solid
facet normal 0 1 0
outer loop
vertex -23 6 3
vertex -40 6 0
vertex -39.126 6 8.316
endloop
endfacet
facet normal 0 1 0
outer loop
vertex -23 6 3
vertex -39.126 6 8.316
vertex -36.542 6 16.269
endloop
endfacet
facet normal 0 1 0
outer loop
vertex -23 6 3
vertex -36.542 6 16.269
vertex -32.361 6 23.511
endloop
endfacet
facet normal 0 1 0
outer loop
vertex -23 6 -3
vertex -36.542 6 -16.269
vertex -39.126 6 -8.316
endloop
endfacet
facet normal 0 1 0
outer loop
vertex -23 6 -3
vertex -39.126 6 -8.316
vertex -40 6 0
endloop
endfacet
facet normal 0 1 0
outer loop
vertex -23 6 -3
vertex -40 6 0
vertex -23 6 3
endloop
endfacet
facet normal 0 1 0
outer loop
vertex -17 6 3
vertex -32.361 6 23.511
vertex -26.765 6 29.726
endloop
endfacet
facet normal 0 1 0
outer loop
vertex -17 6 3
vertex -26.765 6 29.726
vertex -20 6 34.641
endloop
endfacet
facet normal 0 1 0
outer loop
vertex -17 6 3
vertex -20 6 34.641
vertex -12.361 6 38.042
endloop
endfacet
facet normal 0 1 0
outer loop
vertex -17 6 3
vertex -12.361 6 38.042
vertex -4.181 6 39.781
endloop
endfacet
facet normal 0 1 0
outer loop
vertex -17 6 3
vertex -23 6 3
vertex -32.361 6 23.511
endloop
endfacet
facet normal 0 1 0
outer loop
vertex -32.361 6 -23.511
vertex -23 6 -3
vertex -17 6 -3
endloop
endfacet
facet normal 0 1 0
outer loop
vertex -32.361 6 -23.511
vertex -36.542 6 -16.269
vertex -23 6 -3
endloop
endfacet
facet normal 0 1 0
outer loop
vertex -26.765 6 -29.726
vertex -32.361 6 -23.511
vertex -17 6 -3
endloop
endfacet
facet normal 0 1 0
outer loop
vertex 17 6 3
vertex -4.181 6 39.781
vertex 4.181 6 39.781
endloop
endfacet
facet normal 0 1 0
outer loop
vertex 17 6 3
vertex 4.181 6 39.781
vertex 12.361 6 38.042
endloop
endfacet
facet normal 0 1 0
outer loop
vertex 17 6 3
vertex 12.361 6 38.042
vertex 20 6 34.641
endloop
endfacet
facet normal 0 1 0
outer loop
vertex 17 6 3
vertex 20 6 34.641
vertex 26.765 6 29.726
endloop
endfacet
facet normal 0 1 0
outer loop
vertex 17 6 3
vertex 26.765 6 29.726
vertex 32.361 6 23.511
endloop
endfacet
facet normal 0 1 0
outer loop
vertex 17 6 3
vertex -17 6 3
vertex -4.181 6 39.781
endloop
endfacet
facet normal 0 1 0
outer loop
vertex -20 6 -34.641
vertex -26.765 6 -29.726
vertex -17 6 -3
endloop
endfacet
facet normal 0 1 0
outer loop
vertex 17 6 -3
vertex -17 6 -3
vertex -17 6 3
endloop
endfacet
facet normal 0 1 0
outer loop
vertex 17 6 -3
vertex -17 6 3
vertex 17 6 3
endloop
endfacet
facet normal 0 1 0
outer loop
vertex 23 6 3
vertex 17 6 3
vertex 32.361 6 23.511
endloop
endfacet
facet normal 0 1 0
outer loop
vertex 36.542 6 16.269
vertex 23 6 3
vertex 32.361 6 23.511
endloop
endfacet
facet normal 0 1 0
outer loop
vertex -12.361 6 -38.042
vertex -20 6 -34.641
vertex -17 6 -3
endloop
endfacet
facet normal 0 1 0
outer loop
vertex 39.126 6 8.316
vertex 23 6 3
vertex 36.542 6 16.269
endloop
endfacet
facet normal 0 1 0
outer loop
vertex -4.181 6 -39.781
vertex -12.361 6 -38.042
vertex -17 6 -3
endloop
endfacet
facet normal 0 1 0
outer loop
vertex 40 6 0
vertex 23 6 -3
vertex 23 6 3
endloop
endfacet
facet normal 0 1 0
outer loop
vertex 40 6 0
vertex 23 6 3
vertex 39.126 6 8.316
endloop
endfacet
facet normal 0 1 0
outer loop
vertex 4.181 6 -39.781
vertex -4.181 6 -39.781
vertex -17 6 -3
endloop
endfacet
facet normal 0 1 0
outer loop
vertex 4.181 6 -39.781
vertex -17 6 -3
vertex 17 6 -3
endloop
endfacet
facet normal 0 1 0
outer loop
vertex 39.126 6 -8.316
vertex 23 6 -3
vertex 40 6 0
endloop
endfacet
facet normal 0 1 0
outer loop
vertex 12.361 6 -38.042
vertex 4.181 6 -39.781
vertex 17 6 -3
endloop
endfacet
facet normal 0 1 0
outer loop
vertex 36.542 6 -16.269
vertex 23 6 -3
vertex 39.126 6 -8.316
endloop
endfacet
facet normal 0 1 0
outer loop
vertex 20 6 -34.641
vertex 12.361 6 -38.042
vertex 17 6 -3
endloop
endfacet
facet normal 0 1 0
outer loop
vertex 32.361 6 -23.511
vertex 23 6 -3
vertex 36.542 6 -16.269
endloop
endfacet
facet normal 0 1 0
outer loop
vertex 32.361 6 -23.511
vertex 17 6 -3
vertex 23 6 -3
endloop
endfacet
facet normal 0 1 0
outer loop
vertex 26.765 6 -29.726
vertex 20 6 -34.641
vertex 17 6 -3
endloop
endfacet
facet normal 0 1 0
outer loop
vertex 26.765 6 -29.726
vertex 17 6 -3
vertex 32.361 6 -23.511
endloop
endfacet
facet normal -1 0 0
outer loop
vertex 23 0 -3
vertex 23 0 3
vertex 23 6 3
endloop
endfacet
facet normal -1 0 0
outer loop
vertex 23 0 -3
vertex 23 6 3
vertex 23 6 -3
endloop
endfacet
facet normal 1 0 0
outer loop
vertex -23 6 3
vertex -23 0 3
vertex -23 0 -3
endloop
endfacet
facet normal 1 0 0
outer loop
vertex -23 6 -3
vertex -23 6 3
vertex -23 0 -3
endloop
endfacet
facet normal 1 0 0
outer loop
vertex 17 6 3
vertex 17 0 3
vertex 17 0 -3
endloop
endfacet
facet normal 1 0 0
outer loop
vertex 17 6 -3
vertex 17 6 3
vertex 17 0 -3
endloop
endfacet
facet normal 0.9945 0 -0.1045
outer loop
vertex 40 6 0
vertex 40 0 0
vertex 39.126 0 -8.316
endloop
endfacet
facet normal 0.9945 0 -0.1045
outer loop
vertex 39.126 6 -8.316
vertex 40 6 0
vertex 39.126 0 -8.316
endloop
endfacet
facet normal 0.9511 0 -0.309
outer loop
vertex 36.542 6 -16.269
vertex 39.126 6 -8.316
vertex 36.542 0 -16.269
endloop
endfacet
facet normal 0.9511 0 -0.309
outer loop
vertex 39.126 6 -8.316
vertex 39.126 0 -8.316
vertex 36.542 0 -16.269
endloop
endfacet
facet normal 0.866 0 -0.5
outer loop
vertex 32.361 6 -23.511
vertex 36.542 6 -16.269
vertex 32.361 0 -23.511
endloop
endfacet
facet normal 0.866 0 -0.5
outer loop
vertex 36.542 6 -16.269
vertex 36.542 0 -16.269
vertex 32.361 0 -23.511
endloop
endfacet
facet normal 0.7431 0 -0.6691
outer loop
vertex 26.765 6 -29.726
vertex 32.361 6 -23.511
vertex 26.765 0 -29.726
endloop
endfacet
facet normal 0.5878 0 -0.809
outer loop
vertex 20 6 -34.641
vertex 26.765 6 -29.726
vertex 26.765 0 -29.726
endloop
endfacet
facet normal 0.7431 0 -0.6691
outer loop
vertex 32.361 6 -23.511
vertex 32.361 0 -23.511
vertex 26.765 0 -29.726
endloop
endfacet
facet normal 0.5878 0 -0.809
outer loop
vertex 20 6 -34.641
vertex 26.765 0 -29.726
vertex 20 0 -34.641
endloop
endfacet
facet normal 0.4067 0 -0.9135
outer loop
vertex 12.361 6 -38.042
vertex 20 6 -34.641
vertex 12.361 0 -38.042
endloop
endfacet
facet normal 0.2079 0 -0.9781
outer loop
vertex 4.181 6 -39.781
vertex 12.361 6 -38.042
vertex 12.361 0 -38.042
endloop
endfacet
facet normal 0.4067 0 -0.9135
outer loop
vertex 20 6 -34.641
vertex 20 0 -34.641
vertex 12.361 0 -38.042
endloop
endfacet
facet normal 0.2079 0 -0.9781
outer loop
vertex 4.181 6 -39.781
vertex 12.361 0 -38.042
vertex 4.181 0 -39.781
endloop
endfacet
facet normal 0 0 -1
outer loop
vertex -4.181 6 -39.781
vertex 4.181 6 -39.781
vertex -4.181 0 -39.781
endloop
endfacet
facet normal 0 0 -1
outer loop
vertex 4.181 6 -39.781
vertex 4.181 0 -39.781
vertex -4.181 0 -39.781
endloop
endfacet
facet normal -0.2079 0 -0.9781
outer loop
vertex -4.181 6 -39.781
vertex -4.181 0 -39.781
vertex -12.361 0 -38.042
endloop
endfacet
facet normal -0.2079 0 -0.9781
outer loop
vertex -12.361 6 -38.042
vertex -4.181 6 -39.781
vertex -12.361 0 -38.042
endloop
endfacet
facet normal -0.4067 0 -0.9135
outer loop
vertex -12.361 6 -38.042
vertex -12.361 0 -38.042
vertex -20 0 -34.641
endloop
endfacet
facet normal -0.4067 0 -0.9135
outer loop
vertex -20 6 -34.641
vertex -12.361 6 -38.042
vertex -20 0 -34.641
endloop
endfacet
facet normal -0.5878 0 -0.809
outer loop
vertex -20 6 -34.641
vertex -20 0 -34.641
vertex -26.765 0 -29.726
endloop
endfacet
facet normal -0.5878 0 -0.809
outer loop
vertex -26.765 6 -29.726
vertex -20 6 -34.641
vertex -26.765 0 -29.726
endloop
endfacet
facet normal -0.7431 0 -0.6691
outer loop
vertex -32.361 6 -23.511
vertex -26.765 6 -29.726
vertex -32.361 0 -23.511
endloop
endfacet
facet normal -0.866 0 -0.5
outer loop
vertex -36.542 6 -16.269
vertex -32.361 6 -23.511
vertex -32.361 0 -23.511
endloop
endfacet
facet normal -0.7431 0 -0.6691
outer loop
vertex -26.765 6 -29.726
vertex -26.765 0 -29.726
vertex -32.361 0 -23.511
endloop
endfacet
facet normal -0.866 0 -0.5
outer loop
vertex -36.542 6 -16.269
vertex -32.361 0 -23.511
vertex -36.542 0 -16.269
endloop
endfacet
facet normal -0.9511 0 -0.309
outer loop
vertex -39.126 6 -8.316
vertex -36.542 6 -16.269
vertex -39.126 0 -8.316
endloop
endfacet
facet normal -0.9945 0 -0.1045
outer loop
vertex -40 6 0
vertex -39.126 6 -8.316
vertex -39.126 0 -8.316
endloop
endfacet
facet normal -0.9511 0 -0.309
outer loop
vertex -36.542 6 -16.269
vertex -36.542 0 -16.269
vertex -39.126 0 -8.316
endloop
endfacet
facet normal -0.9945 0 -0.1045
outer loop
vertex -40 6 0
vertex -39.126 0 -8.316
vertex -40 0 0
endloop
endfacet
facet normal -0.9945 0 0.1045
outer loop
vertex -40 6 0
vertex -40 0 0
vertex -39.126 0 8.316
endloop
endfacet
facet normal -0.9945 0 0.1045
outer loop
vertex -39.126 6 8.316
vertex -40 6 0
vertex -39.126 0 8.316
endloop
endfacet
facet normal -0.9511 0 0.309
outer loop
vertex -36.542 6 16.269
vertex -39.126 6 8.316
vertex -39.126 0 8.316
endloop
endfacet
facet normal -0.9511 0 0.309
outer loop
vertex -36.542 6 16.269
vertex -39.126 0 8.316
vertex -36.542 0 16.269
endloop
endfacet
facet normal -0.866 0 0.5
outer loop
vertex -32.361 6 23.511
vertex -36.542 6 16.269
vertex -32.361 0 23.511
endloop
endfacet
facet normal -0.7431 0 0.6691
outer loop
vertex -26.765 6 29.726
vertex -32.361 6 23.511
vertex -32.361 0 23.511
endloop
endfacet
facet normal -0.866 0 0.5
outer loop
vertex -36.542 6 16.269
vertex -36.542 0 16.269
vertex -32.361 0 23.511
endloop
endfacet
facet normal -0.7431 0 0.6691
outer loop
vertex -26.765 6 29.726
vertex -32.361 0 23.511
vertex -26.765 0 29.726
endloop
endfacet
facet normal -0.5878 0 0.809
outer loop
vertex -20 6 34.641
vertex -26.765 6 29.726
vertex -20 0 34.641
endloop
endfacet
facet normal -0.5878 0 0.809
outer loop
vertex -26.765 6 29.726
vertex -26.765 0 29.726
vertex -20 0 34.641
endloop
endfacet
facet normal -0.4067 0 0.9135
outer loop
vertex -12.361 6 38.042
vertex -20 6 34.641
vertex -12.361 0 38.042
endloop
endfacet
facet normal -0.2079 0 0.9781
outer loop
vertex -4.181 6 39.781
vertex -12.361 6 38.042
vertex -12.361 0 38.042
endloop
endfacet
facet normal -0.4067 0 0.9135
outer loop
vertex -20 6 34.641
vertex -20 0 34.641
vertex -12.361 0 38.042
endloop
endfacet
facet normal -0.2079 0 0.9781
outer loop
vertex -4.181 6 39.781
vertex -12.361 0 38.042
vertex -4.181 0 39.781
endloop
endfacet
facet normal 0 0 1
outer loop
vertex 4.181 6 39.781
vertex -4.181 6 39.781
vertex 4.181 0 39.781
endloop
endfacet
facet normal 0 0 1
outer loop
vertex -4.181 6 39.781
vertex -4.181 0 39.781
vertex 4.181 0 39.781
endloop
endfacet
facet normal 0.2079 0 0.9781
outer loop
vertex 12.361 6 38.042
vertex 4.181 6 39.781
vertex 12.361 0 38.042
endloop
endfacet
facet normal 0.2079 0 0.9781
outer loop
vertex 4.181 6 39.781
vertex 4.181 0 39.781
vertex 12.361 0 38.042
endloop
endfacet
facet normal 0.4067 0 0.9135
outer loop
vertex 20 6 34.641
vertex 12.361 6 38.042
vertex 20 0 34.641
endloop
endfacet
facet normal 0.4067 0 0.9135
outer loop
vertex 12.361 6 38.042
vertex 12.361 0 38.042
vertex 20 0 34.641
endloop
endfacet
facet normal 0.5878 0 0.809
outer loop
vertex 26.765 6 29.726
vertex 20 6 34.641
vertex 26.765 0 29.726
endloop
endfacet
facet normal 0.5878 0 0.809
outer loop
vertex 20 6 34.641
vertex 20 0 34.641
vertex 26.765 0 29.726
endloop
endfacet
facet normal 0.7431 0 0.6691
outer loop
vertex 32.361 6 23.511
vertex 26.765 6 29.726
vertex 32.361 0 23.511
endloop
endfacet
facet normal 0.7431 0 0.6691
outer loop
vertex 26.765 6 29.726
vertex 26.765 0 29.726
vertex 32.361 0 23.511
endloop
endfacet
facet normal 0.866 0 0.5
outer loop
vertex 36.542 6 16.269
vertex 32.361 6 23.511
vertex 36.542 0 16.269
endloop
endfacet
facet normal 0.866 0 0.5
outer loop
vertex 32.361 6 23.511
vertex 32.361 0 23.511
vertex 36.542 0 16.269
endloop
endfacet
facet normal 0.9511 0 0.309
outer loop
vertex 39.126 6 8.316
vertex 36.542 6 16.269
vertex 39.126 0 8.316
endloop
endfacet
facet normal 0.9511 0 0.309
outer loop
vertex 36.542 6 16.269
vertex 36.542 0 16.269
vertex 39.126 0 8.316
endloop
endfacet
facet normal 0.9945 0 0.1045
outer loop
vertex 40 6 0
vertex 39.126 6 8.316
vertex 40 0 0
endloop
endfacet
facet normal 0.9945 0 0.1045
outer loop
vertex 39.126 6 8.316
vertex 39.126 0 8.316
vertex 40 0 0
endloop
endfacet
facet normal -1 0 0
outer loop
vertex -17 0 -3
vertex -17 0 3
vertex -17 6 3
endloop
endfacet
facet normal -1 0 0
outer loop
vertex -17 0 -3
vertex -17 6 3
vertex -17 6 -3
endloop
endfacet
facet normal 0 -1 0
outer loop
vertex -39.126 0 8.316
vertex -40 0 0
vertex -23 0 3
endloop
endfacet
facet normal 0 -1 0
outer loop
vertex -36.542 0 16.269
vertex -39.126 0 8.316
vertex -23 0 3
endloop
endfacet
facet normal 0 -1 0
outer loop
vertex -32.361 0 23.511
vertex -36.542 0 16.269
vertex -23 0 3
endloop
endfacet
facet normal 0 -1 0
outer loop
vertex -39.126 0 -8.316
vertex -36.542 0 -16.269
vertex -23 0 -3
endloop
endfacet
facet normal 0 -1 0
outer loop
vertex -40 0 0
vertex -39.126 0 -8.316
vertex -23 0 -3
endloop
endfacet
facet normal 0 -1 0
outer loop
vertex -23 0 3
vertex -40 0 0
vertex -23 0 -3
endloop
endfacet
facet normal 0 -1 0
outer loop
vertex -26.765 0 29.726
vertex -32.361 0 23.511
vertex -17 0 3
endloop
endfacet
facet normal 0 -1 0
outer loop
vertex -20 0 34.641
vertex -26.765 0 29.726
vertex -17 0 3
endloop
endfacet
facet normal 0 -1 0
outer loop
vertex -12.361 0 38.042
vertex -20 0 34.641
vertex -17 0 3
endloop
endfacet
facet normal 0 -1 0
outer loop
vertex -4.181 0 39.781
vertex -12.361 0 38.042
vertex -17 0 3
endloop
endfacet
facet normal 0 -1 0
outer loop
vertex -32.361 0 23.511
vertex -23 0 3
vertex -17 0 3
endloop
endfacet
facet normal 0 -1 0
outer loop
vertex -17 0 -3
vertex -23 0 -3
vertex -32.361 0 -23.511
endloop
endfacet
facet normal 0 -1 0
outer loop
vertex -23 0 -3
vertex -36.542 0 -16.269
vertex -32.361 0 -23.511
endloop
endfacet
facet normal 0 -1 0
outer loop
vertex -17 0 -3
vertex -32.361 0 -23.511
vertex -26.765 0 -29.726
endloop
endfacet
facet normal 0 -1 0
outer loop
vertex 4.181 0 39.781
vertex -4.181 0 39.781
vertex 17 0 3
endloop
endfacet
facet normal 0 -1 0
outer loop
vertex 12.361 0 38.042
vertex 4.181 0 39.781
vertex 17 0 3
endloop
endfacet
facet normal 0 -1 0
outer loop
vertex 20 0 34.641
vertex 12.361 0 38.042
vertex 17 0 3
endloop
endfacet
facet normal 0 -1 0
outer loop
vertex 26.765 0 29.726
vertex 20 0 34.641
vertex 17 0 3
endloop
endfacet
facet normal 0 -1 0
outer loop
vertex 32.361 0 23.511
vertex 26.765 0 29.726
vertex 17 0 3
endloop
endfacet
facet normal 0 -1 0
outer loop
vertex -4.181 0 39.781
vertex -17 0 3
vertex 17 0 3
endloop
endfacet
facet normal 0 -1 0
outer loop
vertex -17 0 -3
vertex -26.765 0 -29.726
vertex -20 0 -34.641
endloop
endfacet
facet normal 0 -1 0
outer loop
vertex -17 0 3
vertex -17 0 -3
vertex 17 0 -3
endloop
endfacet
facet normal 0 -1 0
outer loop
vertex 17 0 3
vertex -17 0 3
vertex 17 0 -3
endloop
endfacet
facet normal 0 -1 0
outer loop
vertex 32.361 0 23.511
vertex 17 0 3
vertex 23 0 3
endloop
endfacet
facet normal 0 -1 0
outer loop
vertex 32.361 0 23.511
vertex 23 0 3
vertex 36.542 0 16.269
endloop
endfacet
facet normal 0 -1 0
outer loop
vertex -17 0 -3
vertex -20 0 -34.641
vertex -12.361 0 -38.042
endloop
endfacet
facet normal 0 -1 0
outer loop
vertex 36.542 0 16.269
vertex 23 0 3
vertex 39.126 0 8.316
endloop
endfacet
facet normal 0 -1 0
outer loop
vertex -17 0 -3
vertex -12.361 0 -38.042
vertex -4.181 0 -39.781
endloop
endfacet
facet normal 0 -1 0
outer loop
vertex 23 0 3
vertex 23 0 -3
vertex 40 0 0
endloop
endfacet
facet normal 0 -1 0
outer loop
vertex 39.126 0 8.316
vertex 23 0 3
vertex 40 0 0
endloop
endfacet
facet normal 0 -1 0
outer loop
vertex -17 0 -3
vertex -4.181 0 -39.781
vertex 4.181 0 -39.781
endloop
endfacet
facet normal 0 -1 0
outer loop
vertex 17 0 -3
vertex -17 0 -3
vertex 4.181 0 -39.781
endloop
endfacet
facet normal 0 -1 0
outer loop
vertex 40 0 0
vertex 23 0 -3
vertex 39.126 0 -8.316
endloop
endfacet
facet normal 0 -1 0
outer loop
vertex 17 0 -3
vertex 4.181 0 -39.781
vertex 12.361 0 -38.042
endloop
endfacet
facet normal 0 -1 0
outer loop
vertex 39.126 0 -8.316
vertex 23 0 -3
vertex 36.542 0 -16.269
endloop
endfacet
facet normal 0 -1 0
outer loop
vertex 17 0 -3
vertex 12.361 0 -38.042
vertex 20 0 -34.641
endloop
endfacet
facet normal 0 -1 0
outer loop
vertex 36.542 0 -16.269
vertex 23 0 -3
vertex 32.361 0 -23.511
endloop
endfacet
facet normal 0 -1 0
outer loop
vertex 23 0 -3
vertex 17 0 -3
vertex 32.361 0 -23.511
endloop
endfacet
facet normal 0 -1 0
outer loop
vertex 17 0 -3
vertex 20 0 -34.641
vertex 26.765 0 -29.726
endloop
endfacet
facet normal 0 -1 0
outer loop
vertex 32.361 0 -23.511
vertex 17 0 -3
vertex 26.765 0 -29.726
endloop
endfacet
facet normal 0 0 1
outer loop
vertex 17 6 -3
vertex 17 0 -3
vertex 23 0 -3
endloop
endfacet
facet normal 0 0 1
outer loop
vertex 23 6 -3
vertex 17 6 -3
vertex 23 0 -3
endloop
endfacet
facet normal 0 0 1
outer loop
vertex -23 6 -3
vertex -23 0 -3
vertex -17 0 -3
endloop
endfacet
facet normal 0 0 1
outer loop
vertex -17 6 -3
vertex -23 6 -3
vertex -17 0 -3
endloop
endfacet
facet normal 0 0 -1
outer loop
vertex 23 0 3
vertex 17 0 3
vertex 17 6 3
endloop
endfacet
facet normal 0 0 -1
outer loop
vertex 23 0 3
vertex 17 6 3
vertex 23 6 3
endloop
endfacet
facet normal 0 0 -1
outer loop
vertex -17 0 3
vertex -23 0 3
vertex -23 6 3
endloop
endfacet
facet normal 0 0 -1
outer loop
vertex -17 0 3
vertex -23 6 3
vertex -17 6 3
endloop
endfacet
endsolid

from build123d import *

# Parameters (mm, degrees)
CROQUIS1_R              = 40
CROQUIS1_W              = 6
CROQUIS1_H              = 6
SALIENTE_EXTRUIR1_DEPTH = 6


with BuildPart() as part:
    # Croquis1 → Saliente-Extruir1 (new body)
    with BuildSketch(Plane(origin=(0, 0, 0), x_dir=(1, 0, 0), z_dir=(0, 1, 0))):
        Circle(CROQUIS1_R)
        with Locations((-20, 0)):
            Rectangle(CROQUIS1_W, CROQUIS1_H, mode=Mode.SUBTRACT)
        with Locations((20, 0)):
            Rectangle(CROQUIS1_W, CROQUIS1_H, mode=Mode.SUBTRACT)
    extrude(amount=SALIENTE_EXTRUIR1_DEPTH)


solid = part.part
